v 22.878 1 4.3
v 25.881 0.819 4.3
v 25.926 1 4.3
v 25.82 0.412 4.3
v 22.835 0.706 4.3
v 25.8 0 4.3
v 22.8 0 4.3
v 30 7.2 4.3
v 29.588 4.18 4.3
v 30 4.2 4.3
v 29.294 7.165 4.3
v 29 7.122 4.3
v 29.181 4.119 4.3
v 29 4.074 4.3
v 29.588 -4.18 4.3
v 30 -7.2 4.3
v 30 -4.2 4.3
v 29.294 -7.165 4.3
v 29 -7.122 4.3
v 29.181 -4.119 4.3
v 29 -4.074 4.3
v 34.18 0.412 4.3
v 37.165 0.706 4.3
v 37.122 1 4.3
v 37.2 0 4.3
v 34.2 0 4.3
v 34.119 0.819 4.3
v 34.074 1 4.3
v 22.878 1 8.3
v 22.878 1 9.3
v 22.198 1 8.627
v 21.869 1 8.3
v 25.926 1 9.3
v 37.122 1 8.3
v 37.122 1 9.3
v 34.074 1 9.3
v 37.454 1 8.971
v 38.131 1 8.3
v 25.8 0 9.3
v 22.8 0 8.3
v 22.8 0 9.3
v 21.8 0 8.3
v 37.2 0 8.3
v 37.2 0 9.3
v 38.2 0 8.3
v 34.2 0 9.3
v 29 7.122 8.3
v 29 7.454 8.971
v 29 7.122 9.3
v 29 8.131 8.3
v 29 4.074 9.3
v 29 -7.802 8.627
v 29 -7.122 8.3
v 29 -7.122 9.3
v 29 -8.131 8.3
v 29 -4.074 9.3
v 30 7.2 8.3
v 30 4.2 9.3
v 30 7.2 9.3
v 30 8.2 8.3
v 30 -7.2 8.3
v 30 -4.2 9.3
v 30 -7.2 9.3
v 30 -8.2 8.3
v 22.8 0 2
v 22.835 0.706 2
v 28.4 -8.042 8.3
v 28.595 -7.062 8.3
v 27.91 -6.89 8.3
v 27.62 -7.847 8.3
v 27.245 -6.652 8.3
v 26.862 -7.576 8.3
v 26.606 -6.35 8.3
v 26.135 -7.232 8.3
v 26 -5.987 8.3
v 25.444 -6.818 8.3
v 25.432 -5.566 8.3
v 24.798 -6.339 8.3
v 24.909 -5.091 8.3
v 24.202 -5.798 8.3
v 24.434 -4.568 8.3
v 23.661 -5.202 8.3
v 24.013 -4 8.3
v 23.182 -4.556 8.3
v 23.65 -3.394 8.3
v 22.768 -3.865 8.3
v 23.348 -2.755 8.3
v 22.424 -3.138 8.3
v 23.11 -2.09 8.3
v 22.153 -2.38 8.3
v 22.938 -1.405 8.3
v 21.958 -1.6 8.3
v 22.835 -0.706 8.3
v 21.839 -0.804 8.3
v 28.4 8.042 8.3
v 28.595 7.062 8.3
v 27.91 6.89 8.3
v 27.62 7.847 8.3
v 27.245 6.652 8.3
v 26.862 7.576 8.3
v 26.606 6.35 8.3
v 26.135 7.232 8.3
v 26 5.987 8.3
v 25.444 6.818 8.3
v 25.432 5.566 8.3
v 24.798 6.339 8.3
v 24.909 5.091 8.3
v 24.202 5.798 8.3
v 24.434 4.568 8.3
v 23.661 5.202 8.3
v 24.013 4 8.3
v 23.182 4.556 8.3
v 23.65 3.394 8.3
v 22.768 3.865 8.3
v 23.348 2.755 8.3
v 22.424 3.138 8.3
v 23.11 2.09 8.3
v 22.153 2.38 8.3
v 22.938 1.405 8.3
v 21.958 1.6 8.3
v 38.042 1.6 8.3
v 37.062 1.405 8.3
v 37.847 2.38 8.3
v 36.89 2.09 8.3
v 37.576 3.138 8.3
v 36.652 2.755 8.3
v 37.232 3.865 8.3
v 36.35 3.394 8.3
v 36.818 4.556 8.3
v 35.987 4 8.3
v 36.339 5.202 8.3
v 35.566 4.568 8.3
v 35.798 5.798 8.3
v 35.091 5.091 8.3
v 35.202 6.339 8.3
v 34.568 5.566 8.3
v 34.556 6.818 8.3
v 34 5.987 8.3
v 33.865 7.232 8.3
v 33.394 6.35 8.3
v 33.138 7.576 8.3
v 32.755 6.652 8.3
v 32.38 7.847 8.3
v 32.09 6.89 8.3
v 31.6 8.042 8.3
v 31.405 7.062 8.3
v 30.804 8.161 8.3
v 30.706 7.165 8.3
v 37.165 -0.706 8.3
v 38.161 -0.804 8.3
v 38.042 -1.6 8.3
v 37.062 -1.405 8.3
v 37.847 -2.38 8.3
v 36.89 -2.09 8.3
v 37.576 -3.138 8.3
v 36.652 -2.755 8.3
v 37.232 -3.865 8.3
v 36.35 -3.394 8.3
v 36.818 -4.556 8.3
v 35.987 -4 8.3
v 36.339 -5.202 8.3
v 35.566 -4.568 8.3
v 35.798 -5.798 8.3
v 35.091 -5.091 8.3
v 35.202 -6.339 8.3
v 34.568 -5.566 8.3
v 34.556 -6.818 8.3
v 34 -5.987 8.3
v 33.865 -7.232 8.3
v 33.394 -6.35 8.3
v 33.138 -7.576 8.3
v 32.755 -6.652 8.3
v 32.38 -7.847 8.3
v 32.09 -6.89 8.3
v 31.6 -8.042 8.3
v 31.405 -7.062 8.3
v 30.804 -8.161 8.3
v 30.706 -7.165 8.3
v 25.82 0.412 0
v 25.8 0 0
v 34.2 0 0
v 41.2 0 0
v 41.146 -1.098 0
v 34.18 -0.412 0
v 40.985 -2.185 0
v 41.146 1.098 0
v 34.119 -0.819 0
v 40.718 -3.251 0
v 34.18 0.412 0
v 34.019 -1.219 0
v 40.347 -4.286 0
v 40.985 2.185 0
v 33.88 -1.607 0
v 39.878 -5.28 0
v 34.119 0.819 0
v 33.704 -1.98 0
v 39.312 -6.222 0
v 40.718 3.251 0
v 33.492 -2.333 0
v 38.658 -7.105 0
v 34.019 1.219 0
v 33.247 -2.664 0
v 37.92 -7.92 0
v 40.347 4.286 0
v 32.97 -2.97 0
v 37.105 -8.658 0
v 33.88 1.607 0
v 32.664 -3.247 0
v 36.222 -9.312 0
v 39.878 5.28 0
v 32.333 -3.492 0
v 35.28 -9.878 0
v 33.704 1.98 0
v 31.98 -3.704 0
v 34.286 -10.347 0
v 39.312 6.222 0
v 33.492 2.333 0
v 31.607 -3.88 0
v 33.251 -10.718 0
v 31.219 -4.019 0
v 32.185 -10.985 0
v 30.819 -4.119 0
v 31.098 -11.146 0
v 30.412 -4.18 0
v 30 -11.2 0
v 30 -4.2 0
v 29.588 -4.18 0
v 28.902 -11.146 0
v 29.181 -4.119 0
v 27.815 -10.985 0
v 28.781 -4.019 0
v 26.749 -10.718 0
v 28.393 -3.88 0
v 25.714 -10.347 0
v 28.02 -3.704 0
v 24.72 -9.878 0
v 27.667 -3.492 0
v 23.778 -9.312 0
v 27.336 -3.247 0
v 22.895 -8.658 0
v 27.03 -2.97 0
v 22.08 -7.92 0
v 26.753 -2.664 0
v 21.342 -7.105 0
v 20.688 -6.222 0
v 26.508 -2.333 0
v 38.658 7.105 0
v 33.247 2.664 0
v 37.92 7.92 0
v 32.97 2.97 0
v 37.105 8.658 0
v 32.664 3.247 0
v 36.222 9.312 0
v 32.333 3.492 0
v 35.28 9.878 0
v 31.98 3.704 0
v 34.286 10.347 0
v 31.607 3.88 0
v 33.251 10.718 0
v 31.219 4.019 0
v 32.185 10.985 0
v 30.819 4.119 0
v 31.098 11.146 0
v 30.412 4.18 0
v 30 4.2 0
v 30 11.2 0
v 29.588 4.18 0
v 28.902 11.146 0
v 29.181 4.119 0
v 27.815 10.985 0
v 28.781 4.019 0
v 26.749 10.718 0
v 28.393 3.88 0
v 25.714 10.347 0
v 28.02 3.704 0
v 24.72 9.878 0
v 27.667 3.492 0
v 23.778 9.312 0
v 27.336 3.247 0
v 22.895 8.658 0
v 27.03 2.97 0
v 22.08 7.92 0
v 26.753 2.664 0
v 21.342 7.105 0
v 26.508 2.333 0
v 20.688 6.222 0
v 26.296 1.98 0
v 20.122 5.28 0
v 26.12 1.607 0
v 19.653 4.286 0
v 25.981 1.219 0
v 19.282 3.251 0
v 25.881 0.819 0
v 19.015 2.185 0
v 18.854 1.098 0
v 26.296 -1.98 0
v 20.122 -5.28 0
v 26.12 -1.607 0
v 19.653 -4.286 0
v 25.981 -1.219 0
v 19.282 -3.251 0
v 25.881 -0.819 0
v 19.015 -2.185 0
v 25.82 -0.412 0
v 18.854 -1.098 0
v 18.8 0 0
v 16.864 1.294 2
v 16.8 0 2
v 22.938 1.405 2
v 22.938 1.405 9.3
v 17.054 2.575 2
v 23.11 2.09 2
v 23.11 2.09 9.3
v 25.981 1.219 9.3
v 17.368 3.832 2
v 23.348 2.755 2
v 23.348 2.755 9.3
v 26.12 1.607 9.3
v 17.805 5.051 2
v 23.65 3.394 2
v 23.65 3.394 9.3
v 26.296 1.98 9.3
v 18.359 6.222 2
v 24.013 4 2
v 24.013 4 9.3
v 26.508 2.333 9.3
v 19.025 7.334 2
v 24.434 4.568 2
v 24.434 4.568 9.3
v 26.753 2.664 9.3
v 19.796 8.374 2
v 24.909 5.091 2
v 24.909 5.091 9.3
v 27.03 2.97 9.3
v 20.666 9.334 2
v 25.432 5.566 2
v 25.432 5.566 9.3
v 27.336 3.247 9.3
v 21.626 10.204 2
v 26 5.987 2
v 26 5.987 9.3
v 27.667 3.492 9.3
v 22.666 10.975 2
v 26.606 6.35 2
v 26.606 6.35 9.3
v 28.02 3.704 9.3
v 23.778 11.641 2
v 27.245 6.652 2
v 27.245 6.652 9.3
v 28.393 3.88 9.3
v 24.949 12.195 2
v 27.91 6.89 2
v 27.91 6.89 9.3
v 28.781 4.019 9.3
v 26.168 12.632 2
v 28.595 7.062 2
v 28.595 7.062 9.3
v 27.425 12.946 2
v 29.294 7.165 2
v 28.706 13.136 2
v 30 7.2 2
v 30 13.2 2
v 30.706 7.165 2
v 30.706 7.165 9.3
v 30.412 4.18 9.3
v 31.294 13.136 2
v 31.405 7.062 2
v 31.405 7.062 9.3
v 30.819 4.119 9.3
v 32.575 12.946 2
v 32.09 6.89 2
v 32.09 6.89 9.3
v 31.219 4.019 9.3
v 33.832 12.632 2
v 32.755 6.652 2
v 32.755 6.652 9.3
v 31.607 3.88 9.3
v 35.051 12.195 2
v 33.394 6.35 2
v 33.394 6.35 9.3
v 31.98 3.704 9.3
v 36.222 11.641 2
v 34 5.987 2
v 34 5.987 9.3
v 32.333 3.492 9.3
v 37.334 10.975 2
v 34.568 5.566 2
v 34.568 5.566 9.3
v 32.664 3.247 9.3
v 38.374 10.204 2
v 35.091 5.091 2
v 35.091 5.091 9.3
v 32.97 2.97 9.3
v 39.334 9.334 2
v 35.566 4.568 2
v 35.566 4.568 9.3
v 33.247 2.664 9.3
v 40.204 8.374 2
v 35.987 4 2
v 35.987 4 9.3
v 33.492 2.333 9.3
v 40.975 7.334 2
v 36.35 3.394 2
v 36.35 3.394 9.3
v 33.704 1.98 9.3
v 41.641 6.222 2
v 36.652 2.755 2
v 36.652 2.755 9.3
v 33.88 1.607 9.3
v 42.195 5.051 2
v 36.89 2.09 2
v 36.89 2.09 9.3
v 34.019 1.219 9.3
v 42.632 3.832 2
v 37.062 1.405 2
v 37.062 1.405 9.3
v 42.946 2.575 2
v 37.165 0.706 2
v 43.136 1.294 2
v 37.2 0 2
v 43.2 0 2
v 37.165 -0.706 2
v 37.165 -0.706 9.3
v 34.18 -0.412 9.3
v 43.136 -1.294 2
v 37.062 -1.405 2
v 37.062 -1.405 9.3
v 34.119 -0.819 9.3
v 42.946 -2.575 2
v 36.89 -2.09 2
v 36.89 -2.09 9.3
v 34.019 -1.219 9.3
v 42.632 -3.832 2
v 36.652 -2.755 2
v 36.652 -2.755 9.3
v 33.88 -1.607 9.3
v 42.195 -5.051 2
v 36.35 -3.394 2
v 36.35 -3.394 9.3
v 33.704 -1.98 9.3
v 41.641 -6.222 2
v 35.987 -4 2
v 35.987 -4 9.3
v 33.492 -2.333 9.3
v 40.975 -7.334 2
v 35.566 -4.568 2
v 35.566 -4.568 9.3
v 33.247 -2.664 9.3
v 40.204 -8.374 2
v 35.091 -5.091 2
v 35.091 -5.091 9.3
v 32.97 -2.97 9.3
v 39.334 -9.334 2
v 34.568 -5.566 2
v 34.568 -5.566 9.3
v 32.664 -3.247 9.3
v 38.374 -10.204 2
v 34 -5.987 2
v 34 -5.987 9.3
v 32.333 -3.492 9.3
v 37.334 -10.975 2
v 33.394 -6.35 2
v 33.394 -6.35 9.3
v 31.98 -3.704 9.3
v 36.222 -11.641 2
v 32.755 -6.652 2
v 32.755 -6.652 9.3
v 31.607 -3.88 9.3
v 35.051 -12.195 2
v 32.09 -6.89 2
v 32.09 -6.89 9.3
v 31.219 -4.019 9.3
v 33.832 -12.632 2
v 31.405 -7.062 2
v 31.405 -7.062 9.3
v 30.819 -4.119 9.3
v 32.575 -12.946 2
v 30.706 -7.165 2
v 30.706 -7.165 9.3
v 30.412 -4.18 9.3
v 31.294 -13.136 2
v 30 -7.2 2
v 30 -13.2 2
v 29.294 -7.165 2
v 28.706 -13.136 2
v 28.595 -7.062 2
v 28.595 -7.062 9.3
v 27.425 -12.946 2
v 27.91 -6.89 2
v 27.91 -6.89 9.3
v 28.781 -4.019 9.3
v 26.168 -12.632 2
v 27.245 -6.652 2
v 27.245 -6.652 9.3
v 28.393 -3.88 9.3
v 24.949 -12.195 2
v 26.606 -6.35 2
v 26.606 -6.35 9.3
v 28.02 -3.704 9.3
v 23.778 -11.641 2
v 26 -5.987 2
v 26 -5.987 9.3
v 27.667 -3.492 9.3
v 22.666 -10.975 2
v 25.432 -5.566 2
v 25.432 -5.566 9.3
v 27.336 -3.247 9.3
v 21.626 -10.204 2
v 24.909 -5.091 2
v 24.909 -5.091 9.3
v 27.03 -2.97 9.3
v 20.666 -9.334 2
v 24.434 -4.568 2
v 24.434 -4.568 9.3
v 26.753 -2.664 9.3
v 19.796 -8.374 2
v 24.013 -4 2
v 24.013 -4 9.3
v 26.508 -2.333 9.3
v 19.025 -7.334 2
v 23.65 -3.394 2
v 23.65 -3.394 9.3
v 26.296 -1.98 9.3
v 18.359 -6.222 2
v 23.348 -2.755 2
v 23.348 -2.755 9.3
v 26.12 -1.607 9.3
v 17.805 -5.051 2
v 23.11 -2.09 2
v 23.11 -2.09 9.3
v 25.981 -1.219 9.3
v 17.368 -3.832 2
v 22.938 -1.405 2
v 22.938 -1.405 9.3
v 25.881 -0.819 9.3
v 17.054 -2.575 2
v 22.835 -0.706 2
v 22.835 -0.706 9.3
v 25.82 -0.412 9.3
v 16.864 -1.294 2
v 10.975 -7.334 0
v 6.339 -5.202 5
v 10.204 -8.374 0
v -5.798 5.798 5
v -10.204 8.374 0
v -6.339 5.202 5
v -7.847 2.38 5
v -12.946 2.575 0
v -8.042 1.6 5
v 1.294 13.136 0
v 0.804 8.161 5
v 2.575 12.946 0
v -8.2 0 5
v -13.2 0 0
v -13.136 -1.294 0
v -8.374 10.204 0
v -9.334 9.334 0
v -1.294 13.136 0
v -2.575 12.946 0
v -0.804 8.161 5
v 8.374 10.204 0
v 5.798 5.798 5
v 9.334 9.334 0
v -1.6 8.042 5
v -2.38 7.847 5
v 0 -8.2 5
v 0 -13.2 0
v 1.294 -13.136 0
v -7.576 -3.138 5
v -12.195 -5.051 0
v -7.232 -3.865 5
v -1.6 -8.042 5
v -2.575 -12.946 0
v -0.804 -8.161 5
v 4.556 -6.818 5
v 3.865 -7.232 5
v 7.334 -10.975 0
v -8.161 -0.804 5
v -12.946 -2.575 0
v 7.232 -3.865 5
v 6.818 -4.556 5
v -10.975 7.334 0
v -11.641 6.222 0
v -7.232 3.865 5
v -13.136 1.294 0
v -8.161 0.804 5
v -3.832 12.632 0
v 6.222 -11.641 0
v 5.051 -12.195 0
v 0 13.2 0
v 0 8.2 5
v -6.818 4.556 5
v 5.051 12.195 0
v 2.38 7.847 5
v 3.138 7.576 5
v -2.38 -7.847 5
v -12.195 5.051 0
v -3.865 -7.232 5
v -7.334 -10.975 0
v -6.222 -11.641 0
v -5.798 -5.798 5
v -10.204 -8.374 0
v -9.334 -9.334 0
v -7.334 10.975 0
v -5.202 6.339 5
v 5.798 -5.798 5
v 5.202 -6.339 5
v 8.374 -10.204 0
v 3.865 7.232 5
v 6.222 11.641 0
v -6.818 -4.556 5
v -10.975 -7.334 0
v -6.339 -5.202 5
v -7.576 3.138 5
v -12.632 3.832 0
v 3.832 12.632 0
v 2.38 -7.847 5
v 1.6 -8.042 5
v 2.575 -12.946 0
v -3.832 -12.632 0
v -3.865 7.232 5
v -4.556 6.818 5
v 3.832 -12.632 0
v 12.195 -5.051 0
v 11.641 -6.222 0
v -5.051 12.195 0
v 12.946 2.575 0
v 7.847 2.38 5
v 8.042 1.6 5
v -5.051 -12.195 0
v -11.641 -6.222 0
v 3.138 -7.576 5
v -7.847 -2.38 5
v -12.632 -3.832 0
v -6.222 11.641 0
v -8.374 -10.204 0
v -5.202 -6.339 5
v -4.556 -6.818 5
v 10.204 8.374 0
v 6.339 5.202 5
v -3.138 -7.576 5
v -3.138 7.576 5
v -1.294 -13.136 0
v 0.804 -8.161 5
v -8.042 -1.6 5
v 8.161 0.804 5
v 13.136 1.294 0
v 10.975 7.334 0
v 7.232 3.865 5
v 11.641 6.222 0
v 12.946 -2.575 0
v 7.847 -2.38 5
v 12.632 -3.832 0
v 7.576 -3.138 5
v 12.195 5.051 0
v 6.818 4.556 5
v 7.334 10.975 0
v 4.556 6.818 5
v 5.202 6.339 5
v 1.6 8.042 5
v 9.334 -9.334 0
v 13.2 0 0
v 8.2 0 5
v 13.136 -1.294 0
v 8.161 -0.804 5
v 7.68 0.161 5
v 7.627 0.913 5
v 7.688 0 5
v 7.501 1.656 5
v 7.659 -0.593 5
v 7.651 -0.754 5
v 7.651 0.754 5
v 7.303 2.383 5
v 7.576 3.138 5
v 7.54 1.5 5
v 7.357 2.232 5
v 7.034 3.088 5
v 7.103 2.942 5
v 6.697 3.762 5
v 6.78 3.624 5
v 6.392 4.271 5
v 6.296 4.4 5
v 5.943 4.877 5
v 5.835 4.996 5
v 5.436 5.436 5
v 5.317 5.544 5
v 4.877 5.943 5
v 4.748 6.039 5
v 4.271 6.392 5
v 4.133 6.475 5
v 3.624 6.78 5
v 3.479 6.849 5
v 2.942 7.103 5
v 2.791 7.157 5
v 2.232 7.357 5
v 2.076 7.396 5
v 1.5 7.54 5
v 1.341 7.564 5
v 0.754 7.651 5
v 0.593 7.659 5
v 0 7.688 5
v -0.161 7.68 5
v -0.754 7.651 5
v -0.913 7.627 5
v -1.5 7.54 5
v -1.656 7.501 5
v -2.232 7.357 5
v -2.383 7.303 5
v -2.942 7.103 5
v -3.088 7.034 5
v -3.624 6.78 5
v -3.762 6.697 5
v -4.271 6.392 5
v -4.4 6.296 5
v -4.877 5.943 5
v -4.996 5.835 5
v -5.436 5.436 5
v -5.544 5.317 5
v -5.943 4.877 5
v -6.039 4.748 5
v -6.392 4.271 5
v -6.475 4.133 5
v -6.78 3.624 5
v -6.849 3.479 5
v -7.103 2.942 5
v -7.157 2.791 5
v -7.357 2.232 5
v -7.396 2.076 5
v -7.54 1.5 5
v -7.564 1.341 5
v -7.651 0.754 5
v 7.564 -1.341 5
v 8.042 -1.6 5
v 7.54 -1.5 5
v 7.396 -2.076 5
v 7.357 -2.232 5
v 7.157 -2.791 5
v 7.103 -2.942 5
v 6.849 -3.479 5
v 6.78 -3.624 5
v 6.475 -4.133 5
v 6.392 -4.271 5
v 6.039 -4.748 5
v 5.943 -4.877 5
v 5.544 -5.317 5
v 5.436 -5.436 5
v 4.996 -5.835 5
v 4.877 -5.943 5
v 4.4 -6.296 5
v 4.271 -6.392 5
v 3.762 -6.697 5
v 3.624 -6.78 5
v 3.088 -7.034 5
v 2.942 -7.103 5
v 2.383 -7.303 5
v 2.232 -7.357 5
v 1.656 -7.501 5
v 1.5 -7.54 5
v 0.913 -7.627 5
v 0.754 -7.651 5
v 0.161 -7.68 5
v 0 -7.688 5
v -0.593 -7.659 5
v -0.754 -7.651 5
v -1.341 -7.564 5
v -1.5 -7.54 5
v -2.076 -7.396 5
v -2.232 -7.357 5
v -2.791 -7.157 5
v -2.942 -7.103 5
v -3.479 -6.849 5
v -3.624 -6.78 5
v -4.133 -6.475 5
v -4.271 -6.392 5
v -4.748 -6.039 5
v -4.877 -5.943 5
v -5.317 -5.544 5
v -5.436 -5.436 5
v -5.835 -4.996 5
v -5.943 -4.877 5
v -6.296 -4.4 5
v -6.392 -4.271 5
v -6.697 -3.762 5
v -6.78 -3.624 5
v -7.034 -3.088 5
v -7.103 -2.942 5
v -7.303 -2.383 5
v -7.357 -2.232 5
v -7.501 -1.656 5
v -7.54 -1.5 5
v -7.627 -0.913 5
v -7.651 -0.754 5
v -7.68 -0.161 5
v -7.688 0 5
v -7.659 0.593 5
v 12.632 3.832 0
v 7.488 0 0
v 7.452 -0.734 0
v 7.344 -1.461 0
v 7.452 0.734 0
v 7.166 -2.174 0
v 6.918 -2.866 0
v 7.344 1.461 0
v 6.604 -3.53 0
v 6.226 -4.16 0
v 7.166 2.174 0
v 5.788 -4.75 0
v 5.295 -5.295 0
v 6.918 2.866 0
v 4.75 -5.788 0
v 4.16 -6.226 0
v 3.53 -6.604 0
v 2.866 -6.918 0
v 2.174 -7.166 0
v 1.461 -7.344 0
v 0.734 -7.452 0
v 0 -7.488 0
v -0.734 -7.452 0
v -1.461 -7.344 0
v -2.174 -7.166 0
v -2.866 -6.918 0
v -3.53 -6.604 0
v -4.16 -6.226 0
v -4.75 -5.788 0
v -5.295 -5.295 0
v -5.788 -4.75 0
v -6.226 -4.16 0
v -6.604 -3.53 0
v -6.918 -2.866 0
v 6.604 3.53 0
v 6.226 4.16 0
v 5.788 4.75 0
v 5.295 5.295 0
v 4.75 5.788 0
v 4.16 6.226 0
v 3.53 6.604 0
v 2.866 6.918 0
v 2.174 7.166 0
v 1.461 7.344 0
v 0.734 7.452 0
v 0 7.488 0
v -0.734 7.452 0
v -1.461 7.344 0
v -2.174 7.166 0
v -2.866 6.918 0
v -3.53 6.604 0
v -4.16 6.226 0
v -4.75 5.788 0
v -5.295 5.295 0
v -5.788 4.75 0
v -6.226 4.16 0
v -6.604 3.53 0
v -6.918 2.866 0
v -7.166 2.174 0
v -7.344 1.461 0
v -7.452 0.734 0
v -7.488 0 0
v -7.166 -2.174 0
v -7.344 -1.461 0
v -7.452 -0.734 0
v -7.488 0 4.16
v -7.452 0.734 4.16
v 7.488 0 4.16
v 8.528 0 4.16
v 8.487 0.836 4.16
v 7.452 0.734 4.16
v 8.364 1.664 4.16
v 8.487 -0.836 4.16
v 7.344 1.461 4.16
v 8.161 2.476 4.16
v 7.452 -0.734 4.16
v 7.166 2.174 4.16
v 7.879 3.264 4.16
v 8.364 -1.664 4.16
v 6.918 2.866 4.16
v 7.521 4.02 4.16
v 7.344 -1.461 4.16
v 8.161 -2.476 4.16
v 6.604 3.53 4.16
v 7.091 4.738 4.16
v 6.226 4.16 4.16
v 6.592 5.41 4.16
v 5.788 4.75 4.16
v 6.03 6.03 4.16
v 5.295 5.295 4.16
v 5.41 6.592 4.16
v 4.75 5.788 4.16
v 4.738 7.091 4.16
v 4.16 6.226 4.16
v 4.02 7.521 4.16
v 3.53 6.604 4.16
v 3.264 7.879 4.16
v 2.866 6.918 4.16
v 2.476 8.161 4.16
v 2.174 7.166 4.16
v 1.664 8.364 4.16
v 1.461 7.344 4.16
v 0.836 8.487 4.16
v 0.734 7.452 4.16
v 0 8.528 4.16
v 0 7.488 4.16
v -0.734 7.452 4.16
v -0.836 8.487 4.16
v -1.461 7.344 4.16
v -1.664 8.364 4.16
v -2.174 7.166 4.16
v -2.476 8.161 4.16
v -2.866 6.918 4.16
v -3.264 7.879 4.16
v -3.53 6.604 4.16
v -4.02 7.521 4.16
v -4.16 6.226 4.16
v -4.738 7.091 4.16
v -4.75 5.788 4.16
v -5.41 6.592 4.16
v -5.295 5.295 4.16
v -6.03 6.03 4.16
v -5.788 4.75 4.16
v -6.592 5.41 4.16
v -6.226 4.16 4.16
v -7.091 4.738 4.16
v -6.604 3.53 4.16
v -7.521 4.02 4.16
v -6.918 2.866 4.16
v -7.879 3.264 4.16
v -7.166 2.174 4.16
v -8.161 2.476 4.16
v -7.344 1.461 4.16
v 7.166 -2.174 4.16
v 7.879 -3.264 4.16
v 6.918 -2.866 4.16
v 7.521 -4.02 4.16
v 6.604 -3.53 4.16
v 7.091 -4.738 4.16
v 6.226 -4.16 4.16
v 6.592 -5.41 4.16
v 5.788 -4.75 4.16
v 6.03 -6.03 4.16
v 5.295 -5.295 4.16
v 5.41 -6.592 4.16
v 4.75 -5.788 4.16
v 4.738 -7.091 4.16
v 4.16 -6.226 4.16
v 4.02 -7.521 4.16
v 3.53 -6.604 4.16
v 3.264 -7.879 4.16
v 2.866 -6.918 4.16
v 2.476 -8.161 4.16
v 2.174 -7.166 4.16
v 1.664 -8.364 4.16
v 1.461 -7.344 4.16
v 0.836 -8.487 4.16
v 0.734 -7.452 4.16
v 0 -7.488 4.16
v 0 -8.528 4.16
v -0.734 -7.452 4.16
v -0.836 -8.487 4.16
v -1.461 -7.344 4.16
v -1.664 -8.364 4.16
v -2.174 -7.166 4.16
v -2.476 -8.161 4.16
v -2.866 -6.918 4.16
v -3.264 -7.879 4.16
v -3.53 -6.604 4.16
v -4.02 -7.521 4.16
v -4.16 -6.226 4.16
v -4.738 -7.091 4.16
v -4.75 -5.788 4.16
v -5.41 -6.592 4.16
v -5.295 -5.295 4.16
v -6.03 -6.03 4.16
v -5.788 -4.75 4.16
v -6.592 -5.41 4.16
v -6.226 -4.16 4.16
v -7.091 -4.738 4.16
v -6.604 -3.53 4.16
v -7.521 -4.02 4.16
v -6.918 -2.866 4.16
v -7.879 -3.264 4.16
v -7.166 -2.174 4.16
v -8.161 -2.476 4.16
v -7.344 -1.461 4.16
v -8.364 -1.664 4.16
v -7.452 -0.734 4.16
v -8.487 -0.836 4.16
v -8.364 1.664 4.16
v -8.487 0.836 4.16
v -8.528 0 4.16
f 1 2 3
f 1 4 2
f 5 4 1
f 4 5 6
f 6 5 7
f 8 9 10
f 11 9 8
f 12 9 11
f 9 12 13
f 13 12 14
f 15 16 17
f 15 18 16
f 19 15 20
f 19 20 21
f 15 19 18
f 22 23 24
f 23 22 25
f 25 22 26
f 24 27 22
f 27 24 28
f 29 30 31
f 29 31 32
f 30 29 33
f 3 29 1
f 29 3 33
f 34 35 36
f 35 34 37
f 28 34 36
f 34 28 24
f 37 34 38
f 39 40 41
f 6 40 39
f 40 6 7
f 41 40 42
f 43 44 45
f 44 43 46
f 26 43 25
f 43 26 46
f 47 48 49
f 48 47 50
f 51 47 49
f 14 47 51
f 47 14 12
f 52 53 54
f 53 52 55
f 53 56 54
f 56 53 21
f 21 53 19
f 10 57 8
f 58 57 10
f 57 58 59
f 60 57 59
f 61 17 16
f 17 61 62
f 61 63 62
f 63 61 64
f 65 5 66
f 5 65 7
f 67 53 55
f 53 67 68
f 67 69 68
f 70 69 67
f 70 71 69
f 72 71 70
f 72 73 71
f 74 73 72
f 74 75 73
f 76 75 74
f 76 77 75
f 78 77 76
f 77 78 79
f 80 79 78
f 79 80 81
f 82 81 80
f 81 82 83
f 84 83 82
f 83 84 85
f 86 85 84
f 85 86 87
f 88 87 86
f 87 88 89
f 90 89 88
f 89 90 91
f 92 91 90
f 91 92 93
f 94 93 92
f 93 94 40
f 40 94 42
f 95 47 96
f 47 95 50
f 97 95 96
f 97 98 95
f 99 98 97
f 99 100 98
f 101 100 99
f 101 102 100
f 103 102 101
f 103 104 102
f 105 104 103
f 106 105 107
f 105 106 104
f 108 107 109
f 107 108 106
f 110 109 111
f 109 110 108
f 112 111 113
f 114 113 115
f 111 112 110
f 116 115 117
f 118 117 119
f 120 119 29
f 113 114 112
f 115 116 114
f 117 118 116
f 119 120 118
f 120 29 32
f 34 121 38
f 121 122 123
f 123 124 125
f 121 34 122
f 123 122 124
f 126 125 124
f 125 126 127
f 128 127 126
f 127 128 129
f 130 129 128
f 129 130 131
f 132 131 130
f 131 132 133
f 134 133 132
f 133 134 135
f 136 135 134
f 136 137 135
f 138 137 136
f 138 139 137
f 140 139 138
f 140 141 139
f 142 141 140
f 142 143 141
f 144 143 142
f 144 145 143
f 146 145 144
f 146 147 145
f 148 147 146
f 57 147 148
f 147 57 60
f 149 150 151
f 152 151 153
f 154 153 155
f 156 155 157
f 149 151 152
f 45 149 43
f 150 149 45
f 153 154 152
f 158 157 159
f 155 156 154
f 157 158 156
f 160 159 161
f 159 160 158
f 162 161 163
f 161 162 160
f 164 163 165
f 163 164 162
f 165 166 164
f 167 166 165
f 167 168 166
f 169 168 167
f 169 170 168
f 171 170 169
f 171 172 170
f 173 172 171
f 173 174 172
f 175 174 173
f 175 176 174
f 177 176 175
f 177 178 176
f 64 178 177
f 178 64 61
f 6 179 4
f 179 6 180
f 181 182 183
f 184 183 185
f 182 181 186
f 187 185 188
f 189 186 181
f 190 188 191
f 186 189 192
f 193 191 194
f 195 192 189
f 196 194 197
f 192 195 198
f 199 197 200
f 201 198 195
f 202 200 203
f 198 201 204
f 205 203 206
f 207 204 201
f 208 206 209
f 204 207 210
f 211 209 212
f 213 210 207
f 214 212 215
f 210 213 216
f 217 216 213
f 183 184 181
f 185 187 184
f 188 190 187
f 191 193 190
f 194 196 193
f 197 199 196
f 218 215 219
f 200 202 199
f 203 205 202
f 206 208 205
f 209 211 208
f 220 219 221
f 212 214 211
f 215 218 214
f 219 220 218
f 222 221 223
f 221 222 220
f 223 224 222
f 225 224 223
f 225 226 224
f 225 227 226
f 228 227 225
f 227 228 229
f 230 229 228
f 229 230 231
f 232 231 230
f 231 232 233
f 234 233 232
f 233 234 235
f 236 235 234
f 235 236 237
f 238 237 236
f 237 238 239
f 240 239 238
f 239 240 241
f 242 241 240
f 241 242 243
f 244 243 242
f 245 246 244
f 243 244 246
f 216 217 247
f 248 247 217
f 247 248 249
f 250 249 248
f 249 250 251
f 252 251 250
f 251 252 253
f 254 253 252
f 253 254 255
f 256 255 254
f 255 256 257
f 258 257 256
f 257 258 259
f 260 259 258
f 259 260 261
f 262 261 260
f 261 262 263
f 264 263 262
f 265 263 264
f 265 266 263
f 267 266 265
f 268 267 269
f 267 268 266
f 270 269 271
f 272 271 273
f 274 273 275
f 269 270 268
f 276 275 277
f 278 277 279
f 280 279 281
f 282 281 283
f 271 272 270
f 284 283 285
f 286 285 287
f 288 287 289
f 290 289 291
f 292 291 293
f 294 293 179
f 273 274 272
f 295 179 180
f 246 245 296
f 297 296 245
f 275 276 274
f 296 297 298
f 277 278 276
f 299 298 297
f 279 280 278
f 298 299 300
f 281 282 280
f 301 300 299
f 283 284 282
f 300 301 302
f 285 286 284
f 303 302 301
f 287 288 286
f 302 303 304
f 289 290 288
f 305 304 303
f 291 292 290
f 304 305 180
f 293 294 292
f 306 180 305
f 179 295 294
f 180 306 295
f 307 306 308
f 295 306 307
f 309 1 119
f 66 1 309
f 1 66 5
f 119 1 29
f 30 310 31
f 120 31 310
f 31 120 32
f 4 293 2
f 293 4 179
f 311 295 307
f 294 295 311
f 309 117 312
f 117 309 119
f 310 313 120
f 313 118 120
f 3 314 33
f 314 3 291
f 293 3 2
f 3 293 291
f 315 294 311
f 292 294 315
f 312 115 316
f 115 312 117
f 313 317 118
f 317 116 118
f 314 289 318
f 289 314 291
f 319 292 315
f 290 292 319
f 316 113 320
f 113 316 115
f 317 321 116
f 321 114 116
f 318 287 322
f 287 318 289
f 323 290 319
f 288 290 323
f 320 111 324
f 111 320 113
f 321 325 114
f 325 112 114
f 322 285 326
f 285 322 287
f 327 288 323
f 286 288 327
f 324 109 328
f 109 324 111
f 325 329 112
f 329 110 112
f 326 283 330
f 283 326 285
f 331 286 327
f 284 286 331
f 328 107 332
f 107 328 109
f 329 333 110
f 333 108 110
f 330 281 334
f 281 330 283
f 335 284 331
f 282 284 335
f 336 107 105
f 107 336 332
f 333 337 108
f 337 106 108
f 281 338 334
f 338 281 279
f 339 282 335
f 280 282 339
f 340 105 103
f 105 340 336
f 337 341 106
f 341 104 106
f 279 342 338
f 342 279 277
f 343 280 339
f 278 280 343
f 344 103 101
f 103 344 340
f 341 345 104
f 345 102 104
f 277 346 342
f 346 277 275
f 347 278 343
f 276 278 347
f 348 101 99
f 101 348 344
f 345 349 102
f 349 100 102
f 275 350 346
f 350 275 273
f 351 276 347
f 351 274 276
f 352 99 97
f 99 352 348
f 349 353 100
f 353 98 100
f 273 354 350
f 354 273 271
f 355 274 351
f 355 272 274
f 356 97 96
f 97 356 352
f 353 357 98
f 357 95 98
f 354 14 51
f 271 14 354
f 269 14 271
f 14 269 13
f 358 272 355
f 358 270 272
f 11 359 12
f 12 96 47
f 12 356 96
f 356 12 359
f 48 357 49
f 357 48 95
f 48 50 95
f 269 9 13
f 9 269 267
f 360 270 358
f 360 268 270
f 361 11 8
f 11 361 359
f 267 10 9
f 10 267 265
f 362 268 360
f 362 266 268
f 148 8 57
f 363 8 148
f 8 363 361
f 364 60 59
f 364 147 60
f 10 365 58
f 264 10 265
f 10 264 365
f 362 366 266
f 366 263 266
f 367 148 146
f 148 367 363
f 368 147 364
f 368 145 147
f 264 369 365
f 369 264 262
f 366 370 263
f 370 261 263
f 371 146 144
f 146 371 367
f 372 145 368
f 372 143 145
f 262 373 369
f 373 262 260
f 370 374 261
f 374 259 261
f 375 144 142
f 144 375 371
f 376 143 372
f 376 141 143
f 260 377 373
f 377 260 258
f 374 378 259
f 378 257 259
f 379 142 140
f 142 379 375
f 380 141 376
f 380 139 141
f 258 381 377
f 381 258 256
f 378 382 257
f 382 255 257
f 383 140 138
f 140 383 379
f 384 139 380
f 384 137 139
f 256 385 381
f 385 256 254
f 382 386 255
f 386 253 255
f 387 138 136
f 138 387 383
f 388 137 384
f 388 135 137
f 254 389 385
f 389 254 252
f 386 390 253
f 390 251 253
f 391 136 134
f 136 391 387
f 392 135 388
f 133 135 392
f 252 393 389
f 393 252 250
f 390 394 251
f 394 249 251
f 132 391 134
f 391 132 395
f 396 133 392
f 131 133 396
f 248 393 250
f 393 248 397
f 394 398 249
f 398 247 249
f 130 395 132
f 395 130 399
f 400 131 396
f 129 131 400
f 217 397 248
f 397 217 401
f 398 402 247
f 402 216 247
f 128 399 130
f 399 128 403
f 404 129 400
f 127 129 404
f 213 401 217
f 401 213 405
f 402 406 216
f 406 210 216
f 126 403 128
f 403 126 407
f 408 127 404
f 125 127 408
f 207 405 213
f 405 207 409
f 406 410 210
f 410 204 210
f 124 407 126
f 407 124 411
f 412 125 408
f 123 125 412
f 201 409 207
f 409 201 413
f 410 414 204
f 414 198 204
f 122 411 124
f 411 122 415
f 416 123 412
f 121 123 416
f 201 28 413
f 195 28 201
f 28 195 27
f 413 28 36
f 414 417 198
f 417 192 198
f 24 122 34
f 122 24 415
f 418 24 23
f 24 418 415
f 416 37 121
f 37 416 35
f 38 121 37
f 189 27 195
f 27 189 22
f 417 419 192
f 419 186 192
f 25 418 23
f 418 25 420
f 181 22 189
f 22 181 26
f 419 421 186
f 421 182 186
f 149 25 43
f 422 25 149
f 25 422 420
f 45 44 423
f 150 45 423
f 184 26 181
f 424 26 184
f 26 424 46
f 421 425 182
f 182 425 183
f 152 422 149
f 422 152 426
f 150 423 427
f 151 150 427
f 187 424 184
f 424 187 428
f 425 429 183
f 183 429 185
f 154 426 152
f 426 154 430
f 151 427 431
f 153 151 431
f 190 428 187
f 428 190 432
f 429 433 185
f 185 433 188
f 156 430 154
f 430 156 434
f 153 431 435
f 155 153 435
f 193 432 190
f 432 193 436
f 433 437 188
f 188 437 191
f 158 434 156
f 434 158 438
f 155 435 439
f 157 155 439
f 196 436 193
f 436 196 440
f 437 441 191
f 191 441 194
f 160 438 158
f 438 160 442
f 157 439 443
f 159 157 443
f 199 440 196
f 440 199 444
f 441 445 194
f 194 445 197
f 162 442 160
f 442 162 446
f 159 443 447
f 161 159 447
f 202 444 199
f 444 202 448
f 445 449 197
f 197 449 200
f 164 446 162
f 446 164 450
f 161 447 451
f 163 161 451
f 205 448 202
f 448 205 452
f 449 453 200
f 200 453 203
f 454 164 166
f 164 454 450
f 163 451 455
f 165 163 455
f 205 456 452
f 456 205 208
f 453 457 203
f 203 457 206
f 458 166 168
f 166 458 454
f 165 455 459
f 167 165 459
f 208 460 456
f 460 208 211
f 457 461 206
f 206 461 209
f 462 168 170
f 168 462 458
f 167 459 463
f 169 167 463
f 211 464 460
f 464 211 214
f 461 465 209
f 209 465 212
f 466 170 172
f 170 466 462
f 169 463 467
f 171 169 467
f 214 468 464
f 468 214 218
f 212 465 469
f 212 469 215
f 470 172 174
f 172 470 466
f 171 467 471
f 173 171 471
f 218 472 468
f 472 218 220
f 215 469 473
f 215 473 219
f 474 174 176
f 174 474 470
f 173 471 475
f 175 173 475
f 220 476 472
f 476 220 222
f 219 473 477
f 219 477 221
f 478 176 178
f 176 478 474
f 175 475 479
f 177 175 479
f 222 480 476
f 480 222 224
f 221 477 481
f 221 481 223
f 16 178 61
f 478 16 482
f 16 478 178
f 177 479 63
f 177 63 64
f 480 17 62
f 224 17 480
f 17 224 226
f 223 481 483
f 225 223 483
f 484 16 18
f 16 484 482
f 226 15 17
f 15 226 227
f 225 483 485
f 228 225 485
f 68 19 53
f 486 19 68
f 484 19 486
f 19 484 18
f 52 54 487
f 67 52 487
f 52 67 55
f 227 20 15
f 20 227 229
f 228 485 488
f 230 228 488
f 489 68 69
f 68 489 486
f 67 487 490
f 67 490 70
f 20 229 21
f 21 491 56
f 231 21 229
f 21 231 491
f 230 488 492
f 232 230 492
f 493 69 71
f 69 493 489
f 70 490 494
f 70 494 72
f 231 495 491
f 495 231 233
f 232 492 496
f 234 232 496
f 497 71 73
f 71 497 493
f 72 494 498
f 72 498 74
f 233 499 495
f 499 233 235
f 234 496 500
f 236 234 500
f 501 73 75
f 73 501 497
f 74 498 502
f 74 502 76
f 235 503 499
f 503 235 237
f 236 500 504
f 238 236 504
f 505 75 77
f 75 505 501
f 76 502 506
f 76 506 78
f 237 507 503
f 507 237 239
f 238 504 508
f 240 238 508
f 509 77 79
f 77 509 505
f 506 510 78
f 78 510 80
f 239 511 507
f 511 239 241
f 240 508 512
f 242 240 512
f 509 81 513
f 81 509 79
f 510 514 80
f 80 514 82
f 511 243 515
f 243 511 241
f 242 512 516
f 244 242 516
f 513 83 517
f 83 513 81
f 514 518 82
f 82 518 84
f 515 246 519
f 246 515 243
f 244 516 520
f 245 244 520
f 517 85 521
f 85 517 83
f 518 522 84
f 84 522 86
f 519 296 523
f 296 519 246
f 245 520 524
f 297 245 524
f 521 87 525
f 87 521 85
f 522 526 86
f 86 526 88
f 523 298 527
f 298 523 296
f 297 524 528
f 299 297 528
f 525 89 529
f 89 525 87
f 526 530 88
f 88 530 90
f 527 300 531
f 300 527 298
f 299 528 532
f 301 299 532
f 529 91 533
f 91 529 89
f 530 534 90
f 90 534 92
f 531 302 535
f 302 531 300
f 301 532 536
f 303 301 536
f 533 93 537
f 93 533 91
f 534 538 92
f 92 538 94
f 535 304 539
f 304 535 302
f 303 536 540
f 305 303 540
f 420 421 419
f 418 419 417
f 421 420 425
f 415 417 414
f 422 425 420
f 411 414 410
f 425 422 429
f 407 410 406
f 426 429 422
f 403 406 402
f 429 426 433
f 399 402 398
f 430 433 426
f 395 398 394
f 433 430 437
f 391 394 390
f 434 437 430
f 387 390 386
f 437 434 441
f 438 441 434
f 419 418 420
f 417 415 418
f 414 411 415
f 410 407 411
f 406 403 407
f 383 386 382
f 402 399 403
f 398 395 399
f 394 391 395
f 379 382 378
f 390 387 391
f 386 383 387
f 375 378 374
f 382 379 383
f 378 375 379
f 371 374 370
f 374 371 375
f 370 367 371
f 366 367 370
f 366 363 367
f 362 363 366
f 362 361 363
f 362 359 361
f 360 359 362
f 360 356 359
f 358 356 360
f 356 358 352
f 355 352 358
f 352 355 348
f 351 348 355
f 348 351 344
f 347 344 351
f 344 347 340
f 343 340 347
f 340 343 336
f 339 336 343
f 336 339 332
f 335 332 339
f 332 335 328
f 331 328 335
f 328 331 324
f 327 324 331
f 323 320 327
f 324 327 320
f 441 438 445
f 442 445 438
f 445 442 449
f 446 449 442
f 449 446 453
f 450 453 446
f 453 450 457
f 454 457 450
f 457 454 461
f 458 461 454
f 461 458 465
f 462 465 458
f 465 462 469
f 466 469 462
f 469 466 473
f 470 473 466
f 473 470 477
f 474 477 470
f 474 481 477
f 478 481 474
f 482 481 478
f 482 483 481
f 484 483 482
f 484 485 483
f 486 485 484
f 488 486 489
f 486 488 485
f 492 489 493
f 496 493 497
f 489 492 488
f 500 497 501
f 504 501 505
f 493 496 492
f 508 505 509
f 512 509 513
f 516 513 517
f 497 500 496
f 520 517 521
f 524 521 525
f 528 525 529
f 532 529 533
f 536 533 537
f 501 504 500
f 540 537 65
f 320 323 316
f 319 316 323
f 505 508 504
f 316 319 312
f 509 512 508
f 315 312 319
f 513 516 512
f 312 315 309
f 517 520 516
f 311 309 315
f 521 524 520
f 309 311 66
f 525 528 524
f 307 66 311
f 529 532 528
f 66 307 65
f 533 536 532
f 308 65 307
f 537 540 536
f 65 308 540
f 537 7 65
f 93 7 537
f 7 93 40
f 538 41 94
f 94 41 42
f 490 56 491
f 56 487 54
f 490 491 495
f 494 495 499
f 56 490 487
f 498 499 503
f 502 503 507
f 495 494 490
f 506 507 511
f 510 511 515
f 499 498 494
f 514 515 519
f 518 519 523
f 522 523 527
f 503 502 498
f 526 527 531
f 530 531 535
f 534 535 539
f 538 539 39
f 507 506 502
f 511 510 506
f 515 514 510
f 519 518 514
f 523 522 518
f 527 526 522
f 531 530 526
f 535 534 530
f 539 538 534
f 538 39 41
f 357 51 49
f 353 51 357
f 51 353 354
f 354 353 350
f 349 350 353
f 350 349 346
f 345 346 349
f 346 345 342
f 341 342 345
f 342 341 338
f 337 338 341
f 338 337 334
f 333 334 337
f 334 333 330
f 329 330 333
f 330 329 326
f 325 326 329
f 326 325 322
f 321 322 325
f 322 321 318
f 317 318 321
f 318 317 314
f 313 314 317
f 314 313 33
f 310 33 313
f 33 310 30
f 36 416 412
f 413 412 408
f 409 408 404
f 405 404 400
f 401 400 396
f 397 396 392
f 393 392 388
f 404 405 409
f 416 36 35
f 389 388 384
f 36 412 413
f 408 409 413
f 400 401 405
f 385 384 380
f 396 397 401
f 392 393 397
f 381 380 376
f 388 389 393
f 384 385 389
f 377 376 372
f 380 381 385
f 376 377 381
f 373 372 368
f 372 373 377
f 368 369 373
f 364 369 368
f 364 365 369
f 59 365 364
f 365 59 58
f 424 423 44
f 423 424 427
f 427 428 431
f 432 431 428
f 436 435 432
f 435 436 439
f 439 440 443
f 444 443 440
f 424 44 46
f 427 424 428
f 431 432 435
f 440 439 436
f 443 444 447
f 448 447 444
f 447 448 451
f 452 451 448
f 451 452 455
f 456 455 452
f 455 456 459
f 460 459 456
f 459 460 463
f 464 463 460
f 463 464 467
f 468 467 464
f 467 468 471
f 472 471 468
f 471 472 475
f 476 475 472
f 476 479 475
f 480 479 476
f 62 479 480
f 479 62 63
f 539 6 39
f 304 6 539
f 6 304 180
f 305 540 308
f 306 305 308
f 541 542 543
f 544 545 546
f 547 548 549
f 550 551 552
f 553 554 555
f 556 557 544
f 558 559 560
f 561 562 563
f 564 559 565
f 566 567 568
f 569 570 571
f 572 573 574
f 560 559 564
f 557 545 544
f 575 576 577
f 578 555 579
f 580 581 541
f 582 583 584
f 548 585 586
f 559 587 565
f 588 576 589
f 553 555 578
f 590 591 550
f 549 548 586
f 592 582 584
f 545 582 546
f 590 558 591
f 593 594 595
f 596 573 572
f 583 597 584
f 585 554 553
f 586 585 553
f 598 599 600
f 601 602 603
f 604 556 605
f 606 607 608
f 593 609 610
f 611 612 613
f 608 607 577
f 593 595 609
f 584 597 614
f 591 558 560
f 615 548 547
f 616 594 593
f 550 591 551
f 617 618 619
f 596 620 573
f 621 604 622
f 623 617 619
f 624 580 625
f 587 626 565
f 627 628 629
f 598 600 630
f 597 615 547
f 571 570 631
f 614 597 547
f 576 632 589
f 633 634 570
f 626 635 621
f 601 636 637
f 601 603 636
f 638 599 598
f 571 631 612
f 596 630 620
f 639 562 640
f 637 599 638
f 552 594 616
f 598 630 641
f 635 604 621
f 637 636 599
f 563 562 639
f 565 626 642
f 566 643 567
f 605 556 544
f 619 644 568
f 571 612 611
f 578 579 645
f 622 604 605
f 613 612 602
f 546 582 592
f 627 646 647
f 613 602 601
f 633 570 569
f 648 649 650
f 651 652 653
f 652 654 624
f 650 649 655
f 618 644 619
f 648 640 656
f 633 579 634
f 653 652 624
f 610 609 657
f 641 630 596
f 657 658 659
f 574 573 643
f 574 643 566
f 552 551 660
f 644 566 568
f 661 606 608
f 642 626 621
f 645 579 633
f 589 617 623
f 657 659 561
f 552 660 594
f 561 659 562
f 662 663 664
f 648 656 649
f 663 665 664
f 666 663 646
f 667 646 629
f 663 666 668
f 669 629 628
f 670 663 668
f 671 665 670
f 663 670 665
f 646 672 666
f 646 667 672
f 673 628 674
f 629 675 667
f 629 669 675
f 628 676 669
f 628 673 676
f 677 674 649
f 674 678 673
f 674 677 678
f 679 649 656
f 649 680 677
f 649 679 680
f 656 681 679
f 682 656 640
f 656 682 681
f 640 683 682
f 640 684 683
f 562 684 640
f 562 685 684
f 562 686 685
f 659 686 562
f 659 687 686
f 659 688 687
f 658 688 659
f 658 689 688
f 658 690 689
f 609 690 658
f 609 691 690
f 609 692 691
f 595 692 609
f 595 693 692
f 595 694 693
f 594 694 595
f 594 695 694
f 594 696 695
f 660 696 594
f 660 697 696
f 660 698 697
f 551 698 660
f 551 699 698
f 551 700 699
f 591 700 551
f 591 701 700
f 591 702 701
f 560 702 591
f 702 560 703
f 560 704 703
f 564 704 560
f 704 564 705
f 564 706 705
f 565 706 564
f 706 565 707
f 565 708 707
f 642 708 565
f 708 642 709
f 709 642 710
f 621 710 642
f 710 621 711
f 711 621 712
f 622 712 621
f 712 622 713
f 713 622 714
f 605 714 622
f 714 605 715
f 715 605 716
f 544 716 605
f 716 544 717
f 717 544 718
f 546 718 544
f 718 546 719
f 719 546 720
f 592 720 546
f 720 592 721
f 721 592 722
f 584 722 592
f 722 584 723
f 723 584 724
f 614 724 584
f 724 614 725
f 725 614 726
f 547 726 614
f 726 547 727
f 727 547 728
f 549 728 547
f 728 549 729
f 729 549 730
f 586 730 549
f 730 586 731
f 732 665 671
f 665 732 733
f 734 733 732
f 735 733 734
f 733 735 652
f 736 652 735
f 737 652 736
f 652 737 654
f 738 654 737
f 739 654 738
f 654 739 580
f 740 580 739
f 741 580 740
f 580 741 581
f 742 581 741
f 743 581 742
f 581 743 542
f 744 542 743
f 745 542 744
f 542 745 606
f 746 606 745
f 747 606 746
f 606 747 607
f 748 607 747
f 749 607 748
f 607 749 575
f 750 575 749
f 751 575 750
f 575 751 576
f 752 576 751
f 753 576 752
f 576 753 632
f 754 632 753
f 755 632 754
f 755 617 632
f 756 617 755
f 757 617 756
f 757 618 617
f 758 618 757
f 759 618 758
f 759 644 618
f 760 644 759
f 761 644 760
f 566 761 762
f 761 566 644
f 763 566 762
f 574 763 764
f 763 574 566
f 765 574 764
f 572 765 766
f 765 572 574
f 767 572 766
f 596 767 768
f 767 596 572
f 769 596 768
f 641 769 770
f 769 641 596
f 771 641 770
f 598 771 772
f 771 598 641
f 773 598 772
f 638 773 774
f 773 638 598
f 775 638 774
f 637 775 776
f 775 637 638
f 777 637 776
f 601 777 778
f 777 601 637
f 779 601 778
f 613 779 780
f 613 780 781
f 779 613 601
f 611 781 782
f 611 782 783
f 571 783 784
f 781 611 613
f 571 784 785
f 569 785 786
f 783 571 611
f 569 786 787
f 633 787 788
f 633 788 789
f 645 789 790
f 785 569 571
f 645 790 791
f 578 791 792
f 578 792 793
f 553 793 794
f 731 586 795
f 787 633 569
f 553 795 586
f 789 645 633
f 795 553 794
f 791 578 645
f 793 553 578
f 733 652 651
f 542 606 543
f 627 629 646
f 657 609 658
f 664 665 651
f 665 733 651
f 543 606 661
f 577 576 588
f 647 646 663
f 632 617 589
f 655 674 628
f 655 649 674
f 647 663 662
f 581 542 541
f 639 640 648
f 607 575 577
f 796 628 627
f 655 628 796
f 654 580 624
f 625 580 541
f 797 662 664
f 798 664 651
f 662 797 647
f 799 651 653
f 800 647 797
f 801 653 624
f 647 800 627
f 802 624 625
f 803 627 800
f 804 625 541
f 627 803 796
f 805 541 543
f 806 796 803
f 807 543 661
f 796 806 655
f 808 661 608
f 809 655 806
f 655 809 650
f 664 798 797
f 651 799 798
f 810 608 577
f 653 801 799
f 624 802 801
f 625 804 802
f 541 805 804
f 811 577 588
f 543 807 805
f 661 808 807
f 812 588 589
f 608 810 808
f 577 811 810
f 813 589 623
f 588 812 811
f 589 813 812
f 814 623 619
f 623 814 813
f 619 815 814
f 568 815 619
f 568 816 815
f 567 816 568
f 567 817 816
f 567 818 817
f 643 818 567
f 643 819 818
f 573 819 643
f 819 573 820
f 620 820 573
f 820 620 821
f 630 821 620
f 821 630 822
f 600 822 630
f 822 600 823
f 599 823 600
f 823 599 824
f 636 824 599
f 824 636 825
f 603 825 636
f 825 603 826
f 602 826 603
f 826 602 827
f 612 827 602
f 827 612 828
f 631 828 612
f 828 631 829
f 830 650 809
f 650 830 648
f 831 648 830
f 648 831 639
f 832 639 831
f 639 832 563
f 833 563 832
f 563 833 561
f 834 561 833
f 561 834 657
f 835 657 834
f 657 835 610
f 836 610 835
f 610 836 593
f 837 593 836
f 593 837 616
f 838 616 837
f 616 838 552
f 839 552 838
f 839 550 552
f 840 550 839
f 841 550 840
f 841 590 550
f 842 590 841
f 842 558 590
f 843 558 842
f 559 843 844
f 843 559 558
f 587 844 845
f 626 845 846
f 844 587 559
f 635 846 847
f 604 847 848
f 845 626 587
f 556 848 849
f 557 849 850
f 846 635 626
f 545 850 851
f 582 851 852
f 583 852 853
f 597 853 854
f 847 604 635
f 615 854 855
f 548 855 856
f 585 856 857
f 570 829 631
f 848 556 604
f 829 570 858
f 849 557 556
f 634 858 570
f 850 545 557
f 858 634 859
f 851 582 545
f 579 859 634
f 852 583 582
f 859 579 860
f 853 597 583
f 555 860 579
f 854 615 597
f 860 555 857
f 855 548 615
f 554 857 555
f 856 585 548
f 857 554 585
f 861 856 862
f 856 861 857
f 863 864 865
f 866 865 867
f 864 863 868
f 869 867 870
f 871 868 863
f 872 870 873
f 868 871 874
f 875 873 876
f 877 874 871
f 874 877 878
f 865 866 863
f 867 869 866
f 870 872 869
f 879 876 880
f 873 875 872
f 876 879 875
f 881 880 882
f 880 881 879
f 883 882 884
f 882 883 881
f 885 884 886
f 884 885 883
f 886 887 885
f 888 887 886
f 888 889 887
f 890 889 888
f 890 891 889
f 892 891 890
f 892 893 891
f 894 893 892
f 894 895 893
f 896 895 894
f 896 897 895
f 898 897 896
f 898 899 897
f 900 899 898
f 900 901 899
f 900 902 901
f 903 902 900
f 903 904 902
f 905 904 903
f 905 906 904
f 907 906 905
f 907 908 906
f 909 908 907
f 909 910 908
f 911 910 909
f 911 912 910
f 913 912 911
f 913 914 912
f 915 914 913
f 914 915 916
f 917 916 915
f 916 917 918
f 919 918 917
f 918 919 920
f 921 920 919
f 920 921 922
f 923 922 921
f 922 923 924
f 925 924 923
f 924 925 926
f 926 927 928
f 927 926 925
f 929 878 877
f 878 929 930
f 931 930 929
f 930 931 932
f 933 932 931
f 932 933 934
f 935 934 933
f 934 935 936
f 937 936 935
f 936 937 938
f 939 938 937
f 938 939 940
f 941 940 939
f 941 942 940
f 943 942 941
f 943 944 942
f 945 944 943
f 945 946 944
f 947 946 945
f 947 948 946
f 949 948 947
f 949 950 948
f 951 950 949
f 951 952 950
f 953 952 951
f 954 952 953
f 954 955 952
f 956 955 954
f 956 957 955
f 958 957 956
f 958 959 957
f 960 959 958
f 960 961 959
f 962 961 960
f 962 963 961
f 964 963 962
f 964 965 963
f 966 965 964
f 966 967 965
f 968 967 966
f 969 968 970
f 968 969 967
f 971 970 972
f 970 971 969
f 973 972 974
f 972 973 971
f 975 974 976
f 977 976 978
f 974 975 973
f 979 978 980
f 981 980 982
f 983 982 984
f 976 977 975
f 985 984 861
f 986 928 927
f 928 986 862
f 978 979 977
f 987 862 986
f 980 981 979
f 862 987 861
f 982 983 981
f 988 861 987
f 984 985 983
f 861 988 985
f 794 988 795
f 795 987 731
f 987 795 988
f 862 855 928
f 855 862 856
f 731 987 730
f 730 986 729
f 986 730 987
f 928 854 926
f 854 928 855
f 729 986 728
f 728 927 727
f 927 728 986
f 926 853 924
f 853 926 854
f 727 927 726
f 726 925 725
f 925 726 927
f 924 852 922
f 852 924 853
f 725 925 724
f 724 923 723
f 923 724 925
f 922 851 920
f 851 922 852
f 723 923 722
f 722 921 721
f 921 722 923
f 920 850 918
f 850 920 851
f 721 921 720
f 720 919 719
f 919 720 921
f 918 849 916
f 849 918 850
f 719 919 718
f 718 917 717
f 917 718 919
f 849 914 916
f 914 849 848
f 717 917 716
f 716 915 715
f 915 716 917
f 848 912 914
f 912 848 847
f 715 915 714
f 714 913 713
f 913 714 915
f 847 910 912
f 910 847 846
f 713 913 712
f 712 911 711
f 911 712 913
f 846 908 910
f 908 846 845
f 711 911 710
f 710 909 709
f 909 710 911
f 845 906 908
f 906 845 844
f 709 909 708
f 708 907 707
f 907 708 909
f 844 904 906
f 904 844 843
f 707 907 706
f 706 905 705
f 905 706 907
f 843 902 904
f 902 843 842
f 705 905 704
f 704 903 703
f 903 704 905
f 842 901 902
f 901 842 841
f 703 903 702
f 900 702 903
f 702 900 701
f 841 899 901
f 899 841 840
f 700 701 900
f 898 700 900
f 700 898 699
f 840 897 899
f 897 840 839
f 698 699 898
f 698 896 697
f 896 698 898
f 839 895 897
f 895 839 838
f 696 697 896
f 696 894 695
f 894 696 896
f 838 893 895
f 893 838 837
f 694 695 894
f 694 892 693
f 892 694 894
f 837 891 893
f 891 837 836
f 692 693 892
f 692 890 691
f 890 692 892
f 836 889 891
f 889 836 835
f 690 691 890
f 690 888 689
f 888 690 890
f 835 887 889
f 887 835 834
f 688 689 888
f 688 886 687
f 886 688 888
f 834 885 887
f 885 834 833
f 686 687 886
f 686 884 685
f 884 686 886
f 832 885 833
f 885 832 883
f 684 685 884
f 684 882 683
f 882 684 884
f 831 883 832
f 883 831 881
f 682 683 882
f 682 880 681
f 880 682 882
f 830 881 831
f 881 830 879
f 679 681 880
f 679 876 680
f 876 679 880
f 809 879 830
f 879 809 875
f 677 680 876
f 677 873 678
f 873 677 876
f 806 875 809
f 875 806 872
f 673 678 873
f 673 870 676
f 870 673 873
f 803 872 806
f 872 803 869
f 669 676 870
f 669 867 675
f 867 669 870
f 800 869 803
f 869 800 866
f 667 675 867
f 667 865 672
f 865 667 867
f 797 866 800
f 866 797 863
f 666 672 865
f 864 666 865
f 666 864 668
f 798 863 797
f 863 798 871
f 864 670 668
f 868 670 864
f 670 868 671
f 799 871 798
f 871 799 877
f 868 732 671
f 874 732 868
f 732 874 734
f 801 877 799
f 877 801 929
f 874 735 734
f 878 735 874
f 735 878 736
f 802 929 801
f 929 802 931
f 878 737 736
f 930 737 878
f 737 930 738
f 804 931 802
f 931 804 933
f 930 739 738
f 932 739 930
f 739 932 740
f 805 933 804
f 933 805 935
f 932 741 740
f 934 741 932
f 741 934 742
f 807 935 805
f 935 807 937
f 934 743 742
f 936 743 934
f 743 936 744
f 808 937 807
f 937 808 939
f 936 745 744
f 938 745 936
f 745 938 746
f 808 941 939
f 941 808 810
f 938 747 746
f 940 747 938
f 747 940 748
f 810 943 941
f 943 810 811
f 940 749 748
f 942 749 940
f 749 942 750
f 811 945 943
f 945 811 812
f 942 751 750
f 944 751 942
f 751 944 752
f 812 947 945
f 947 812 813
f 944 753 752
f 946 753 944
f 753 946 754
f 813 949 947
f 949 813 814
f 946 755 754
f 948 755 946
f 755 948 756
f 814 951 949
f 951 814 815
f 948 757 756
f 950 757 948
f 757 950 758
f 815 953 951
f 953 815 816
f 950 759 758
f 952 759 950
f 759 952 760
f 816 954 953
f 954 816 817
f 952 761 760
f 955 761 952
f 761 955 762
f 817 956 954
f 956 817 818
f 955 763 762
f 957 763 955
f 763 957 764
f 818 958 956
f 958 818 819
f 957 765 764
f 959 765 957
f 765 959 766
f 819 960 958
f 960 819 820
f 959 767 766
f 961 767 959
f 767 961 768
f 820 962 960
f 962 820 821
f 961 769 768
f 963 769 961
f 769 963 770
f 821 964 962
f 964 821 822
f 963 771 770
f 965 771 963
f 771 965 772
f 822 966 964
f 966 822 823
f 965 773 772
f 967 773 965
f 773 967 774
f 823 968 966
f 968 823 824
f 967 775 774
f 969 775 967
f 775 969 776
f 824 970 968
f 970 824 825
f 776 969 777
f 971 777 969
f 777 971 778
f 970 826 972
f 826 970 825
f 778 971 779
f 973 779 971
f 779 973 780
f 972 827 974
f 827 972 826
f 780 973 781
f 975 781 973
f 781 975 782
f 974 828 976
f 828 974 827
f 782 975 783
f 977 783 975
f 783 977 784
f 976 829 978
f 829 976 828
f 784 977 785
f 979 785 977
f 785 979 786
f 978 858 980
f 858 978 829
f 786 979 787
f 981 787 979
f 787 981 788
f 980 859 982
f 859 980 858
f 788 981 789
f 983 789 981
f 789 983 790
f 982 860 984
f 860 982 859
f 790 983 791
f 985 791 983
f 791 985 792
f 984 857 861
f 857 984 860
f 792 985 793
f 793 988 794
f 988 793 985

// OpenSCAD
/*

 /|
| |
| |____|\
|       |
|-------|
|-------|
|  ____ |
| |   |/
| |
| |
 \|

 _____
|    |
|    |
|__|\|


___
|  |/|
|    |
|____|

*/

res=64;

big_d_hole_raw=8;
big_r_hole=big_d_hole_raw/2+0.2;

big_hole_thickness=3;

clip=1;
clip_offset=4;
inner_w=2;
inner_l_plus=6;

box_t_raw=2;
box_t=box_t_raw+0.3;

clip_gap = 2;

tol_perc_raw=4;

tol_perc=1+tol_perc_raw/100;

translate([30,0,0])
inner(r_hole=big_r_hole, hole_thickness=big_hole_thickness);
outer(r_hole=big_r_hole, hole_thickness=big_hole_thickness);

module outer(r_hole,hole_thickness){
    max_y=clip_offset+clip;
    max_x=r_hole+hole_thickness+inner_l_plus;

    difference(){
      rotate_extrude($fn=res)
      polygon(points=[
        [0,0],
        [0,max_y],
        [max_x-max_y,max_y],
        [max_x,0],
      ]);

      cylinder(r=r_hole+hole_thickness, h=max_y);

      scale([tol_perc,tol_perc,tol_perc])
      translate([0,0,-(inner_w+box_t)])
      inner(r_hole=r_hole, hole_thickness=hole_thickness, cut=false);
    }
}

module inner(r_hole, hole_thickness, cut=true){
  max_y=inner_w + box_t + clip_offset+clip;
  max_x=r_hole+hole_thickness+inner_l_plus;

  difference(){
    rotate_extrude($fn=res)
    polygon(points=[
      [r_hole,0],
      [r_hole,max_y],
      [r_hole+hole_thickness,max_y],
      [r_hole+hole_thickness+clip,max_y-clip],
      [r_hole+hole_thickness,max_y-clip],
      [r_hole+hole_thickness,inner_w],
      [max_x,inner_w],
      [r_hole+hole_thickness+inner_l_plus-inner_w,0],
    ]
      );

    if(cut){
      translate([-max_x,0,inner_w+box_t])
      cube([max_x*2,clip,max_y]);

      rotate([0,0,90])
      translate([-max_x,0,inner_w+box_t])
      cube([max_x*2,clip,max_y]);
    }
  }
}
